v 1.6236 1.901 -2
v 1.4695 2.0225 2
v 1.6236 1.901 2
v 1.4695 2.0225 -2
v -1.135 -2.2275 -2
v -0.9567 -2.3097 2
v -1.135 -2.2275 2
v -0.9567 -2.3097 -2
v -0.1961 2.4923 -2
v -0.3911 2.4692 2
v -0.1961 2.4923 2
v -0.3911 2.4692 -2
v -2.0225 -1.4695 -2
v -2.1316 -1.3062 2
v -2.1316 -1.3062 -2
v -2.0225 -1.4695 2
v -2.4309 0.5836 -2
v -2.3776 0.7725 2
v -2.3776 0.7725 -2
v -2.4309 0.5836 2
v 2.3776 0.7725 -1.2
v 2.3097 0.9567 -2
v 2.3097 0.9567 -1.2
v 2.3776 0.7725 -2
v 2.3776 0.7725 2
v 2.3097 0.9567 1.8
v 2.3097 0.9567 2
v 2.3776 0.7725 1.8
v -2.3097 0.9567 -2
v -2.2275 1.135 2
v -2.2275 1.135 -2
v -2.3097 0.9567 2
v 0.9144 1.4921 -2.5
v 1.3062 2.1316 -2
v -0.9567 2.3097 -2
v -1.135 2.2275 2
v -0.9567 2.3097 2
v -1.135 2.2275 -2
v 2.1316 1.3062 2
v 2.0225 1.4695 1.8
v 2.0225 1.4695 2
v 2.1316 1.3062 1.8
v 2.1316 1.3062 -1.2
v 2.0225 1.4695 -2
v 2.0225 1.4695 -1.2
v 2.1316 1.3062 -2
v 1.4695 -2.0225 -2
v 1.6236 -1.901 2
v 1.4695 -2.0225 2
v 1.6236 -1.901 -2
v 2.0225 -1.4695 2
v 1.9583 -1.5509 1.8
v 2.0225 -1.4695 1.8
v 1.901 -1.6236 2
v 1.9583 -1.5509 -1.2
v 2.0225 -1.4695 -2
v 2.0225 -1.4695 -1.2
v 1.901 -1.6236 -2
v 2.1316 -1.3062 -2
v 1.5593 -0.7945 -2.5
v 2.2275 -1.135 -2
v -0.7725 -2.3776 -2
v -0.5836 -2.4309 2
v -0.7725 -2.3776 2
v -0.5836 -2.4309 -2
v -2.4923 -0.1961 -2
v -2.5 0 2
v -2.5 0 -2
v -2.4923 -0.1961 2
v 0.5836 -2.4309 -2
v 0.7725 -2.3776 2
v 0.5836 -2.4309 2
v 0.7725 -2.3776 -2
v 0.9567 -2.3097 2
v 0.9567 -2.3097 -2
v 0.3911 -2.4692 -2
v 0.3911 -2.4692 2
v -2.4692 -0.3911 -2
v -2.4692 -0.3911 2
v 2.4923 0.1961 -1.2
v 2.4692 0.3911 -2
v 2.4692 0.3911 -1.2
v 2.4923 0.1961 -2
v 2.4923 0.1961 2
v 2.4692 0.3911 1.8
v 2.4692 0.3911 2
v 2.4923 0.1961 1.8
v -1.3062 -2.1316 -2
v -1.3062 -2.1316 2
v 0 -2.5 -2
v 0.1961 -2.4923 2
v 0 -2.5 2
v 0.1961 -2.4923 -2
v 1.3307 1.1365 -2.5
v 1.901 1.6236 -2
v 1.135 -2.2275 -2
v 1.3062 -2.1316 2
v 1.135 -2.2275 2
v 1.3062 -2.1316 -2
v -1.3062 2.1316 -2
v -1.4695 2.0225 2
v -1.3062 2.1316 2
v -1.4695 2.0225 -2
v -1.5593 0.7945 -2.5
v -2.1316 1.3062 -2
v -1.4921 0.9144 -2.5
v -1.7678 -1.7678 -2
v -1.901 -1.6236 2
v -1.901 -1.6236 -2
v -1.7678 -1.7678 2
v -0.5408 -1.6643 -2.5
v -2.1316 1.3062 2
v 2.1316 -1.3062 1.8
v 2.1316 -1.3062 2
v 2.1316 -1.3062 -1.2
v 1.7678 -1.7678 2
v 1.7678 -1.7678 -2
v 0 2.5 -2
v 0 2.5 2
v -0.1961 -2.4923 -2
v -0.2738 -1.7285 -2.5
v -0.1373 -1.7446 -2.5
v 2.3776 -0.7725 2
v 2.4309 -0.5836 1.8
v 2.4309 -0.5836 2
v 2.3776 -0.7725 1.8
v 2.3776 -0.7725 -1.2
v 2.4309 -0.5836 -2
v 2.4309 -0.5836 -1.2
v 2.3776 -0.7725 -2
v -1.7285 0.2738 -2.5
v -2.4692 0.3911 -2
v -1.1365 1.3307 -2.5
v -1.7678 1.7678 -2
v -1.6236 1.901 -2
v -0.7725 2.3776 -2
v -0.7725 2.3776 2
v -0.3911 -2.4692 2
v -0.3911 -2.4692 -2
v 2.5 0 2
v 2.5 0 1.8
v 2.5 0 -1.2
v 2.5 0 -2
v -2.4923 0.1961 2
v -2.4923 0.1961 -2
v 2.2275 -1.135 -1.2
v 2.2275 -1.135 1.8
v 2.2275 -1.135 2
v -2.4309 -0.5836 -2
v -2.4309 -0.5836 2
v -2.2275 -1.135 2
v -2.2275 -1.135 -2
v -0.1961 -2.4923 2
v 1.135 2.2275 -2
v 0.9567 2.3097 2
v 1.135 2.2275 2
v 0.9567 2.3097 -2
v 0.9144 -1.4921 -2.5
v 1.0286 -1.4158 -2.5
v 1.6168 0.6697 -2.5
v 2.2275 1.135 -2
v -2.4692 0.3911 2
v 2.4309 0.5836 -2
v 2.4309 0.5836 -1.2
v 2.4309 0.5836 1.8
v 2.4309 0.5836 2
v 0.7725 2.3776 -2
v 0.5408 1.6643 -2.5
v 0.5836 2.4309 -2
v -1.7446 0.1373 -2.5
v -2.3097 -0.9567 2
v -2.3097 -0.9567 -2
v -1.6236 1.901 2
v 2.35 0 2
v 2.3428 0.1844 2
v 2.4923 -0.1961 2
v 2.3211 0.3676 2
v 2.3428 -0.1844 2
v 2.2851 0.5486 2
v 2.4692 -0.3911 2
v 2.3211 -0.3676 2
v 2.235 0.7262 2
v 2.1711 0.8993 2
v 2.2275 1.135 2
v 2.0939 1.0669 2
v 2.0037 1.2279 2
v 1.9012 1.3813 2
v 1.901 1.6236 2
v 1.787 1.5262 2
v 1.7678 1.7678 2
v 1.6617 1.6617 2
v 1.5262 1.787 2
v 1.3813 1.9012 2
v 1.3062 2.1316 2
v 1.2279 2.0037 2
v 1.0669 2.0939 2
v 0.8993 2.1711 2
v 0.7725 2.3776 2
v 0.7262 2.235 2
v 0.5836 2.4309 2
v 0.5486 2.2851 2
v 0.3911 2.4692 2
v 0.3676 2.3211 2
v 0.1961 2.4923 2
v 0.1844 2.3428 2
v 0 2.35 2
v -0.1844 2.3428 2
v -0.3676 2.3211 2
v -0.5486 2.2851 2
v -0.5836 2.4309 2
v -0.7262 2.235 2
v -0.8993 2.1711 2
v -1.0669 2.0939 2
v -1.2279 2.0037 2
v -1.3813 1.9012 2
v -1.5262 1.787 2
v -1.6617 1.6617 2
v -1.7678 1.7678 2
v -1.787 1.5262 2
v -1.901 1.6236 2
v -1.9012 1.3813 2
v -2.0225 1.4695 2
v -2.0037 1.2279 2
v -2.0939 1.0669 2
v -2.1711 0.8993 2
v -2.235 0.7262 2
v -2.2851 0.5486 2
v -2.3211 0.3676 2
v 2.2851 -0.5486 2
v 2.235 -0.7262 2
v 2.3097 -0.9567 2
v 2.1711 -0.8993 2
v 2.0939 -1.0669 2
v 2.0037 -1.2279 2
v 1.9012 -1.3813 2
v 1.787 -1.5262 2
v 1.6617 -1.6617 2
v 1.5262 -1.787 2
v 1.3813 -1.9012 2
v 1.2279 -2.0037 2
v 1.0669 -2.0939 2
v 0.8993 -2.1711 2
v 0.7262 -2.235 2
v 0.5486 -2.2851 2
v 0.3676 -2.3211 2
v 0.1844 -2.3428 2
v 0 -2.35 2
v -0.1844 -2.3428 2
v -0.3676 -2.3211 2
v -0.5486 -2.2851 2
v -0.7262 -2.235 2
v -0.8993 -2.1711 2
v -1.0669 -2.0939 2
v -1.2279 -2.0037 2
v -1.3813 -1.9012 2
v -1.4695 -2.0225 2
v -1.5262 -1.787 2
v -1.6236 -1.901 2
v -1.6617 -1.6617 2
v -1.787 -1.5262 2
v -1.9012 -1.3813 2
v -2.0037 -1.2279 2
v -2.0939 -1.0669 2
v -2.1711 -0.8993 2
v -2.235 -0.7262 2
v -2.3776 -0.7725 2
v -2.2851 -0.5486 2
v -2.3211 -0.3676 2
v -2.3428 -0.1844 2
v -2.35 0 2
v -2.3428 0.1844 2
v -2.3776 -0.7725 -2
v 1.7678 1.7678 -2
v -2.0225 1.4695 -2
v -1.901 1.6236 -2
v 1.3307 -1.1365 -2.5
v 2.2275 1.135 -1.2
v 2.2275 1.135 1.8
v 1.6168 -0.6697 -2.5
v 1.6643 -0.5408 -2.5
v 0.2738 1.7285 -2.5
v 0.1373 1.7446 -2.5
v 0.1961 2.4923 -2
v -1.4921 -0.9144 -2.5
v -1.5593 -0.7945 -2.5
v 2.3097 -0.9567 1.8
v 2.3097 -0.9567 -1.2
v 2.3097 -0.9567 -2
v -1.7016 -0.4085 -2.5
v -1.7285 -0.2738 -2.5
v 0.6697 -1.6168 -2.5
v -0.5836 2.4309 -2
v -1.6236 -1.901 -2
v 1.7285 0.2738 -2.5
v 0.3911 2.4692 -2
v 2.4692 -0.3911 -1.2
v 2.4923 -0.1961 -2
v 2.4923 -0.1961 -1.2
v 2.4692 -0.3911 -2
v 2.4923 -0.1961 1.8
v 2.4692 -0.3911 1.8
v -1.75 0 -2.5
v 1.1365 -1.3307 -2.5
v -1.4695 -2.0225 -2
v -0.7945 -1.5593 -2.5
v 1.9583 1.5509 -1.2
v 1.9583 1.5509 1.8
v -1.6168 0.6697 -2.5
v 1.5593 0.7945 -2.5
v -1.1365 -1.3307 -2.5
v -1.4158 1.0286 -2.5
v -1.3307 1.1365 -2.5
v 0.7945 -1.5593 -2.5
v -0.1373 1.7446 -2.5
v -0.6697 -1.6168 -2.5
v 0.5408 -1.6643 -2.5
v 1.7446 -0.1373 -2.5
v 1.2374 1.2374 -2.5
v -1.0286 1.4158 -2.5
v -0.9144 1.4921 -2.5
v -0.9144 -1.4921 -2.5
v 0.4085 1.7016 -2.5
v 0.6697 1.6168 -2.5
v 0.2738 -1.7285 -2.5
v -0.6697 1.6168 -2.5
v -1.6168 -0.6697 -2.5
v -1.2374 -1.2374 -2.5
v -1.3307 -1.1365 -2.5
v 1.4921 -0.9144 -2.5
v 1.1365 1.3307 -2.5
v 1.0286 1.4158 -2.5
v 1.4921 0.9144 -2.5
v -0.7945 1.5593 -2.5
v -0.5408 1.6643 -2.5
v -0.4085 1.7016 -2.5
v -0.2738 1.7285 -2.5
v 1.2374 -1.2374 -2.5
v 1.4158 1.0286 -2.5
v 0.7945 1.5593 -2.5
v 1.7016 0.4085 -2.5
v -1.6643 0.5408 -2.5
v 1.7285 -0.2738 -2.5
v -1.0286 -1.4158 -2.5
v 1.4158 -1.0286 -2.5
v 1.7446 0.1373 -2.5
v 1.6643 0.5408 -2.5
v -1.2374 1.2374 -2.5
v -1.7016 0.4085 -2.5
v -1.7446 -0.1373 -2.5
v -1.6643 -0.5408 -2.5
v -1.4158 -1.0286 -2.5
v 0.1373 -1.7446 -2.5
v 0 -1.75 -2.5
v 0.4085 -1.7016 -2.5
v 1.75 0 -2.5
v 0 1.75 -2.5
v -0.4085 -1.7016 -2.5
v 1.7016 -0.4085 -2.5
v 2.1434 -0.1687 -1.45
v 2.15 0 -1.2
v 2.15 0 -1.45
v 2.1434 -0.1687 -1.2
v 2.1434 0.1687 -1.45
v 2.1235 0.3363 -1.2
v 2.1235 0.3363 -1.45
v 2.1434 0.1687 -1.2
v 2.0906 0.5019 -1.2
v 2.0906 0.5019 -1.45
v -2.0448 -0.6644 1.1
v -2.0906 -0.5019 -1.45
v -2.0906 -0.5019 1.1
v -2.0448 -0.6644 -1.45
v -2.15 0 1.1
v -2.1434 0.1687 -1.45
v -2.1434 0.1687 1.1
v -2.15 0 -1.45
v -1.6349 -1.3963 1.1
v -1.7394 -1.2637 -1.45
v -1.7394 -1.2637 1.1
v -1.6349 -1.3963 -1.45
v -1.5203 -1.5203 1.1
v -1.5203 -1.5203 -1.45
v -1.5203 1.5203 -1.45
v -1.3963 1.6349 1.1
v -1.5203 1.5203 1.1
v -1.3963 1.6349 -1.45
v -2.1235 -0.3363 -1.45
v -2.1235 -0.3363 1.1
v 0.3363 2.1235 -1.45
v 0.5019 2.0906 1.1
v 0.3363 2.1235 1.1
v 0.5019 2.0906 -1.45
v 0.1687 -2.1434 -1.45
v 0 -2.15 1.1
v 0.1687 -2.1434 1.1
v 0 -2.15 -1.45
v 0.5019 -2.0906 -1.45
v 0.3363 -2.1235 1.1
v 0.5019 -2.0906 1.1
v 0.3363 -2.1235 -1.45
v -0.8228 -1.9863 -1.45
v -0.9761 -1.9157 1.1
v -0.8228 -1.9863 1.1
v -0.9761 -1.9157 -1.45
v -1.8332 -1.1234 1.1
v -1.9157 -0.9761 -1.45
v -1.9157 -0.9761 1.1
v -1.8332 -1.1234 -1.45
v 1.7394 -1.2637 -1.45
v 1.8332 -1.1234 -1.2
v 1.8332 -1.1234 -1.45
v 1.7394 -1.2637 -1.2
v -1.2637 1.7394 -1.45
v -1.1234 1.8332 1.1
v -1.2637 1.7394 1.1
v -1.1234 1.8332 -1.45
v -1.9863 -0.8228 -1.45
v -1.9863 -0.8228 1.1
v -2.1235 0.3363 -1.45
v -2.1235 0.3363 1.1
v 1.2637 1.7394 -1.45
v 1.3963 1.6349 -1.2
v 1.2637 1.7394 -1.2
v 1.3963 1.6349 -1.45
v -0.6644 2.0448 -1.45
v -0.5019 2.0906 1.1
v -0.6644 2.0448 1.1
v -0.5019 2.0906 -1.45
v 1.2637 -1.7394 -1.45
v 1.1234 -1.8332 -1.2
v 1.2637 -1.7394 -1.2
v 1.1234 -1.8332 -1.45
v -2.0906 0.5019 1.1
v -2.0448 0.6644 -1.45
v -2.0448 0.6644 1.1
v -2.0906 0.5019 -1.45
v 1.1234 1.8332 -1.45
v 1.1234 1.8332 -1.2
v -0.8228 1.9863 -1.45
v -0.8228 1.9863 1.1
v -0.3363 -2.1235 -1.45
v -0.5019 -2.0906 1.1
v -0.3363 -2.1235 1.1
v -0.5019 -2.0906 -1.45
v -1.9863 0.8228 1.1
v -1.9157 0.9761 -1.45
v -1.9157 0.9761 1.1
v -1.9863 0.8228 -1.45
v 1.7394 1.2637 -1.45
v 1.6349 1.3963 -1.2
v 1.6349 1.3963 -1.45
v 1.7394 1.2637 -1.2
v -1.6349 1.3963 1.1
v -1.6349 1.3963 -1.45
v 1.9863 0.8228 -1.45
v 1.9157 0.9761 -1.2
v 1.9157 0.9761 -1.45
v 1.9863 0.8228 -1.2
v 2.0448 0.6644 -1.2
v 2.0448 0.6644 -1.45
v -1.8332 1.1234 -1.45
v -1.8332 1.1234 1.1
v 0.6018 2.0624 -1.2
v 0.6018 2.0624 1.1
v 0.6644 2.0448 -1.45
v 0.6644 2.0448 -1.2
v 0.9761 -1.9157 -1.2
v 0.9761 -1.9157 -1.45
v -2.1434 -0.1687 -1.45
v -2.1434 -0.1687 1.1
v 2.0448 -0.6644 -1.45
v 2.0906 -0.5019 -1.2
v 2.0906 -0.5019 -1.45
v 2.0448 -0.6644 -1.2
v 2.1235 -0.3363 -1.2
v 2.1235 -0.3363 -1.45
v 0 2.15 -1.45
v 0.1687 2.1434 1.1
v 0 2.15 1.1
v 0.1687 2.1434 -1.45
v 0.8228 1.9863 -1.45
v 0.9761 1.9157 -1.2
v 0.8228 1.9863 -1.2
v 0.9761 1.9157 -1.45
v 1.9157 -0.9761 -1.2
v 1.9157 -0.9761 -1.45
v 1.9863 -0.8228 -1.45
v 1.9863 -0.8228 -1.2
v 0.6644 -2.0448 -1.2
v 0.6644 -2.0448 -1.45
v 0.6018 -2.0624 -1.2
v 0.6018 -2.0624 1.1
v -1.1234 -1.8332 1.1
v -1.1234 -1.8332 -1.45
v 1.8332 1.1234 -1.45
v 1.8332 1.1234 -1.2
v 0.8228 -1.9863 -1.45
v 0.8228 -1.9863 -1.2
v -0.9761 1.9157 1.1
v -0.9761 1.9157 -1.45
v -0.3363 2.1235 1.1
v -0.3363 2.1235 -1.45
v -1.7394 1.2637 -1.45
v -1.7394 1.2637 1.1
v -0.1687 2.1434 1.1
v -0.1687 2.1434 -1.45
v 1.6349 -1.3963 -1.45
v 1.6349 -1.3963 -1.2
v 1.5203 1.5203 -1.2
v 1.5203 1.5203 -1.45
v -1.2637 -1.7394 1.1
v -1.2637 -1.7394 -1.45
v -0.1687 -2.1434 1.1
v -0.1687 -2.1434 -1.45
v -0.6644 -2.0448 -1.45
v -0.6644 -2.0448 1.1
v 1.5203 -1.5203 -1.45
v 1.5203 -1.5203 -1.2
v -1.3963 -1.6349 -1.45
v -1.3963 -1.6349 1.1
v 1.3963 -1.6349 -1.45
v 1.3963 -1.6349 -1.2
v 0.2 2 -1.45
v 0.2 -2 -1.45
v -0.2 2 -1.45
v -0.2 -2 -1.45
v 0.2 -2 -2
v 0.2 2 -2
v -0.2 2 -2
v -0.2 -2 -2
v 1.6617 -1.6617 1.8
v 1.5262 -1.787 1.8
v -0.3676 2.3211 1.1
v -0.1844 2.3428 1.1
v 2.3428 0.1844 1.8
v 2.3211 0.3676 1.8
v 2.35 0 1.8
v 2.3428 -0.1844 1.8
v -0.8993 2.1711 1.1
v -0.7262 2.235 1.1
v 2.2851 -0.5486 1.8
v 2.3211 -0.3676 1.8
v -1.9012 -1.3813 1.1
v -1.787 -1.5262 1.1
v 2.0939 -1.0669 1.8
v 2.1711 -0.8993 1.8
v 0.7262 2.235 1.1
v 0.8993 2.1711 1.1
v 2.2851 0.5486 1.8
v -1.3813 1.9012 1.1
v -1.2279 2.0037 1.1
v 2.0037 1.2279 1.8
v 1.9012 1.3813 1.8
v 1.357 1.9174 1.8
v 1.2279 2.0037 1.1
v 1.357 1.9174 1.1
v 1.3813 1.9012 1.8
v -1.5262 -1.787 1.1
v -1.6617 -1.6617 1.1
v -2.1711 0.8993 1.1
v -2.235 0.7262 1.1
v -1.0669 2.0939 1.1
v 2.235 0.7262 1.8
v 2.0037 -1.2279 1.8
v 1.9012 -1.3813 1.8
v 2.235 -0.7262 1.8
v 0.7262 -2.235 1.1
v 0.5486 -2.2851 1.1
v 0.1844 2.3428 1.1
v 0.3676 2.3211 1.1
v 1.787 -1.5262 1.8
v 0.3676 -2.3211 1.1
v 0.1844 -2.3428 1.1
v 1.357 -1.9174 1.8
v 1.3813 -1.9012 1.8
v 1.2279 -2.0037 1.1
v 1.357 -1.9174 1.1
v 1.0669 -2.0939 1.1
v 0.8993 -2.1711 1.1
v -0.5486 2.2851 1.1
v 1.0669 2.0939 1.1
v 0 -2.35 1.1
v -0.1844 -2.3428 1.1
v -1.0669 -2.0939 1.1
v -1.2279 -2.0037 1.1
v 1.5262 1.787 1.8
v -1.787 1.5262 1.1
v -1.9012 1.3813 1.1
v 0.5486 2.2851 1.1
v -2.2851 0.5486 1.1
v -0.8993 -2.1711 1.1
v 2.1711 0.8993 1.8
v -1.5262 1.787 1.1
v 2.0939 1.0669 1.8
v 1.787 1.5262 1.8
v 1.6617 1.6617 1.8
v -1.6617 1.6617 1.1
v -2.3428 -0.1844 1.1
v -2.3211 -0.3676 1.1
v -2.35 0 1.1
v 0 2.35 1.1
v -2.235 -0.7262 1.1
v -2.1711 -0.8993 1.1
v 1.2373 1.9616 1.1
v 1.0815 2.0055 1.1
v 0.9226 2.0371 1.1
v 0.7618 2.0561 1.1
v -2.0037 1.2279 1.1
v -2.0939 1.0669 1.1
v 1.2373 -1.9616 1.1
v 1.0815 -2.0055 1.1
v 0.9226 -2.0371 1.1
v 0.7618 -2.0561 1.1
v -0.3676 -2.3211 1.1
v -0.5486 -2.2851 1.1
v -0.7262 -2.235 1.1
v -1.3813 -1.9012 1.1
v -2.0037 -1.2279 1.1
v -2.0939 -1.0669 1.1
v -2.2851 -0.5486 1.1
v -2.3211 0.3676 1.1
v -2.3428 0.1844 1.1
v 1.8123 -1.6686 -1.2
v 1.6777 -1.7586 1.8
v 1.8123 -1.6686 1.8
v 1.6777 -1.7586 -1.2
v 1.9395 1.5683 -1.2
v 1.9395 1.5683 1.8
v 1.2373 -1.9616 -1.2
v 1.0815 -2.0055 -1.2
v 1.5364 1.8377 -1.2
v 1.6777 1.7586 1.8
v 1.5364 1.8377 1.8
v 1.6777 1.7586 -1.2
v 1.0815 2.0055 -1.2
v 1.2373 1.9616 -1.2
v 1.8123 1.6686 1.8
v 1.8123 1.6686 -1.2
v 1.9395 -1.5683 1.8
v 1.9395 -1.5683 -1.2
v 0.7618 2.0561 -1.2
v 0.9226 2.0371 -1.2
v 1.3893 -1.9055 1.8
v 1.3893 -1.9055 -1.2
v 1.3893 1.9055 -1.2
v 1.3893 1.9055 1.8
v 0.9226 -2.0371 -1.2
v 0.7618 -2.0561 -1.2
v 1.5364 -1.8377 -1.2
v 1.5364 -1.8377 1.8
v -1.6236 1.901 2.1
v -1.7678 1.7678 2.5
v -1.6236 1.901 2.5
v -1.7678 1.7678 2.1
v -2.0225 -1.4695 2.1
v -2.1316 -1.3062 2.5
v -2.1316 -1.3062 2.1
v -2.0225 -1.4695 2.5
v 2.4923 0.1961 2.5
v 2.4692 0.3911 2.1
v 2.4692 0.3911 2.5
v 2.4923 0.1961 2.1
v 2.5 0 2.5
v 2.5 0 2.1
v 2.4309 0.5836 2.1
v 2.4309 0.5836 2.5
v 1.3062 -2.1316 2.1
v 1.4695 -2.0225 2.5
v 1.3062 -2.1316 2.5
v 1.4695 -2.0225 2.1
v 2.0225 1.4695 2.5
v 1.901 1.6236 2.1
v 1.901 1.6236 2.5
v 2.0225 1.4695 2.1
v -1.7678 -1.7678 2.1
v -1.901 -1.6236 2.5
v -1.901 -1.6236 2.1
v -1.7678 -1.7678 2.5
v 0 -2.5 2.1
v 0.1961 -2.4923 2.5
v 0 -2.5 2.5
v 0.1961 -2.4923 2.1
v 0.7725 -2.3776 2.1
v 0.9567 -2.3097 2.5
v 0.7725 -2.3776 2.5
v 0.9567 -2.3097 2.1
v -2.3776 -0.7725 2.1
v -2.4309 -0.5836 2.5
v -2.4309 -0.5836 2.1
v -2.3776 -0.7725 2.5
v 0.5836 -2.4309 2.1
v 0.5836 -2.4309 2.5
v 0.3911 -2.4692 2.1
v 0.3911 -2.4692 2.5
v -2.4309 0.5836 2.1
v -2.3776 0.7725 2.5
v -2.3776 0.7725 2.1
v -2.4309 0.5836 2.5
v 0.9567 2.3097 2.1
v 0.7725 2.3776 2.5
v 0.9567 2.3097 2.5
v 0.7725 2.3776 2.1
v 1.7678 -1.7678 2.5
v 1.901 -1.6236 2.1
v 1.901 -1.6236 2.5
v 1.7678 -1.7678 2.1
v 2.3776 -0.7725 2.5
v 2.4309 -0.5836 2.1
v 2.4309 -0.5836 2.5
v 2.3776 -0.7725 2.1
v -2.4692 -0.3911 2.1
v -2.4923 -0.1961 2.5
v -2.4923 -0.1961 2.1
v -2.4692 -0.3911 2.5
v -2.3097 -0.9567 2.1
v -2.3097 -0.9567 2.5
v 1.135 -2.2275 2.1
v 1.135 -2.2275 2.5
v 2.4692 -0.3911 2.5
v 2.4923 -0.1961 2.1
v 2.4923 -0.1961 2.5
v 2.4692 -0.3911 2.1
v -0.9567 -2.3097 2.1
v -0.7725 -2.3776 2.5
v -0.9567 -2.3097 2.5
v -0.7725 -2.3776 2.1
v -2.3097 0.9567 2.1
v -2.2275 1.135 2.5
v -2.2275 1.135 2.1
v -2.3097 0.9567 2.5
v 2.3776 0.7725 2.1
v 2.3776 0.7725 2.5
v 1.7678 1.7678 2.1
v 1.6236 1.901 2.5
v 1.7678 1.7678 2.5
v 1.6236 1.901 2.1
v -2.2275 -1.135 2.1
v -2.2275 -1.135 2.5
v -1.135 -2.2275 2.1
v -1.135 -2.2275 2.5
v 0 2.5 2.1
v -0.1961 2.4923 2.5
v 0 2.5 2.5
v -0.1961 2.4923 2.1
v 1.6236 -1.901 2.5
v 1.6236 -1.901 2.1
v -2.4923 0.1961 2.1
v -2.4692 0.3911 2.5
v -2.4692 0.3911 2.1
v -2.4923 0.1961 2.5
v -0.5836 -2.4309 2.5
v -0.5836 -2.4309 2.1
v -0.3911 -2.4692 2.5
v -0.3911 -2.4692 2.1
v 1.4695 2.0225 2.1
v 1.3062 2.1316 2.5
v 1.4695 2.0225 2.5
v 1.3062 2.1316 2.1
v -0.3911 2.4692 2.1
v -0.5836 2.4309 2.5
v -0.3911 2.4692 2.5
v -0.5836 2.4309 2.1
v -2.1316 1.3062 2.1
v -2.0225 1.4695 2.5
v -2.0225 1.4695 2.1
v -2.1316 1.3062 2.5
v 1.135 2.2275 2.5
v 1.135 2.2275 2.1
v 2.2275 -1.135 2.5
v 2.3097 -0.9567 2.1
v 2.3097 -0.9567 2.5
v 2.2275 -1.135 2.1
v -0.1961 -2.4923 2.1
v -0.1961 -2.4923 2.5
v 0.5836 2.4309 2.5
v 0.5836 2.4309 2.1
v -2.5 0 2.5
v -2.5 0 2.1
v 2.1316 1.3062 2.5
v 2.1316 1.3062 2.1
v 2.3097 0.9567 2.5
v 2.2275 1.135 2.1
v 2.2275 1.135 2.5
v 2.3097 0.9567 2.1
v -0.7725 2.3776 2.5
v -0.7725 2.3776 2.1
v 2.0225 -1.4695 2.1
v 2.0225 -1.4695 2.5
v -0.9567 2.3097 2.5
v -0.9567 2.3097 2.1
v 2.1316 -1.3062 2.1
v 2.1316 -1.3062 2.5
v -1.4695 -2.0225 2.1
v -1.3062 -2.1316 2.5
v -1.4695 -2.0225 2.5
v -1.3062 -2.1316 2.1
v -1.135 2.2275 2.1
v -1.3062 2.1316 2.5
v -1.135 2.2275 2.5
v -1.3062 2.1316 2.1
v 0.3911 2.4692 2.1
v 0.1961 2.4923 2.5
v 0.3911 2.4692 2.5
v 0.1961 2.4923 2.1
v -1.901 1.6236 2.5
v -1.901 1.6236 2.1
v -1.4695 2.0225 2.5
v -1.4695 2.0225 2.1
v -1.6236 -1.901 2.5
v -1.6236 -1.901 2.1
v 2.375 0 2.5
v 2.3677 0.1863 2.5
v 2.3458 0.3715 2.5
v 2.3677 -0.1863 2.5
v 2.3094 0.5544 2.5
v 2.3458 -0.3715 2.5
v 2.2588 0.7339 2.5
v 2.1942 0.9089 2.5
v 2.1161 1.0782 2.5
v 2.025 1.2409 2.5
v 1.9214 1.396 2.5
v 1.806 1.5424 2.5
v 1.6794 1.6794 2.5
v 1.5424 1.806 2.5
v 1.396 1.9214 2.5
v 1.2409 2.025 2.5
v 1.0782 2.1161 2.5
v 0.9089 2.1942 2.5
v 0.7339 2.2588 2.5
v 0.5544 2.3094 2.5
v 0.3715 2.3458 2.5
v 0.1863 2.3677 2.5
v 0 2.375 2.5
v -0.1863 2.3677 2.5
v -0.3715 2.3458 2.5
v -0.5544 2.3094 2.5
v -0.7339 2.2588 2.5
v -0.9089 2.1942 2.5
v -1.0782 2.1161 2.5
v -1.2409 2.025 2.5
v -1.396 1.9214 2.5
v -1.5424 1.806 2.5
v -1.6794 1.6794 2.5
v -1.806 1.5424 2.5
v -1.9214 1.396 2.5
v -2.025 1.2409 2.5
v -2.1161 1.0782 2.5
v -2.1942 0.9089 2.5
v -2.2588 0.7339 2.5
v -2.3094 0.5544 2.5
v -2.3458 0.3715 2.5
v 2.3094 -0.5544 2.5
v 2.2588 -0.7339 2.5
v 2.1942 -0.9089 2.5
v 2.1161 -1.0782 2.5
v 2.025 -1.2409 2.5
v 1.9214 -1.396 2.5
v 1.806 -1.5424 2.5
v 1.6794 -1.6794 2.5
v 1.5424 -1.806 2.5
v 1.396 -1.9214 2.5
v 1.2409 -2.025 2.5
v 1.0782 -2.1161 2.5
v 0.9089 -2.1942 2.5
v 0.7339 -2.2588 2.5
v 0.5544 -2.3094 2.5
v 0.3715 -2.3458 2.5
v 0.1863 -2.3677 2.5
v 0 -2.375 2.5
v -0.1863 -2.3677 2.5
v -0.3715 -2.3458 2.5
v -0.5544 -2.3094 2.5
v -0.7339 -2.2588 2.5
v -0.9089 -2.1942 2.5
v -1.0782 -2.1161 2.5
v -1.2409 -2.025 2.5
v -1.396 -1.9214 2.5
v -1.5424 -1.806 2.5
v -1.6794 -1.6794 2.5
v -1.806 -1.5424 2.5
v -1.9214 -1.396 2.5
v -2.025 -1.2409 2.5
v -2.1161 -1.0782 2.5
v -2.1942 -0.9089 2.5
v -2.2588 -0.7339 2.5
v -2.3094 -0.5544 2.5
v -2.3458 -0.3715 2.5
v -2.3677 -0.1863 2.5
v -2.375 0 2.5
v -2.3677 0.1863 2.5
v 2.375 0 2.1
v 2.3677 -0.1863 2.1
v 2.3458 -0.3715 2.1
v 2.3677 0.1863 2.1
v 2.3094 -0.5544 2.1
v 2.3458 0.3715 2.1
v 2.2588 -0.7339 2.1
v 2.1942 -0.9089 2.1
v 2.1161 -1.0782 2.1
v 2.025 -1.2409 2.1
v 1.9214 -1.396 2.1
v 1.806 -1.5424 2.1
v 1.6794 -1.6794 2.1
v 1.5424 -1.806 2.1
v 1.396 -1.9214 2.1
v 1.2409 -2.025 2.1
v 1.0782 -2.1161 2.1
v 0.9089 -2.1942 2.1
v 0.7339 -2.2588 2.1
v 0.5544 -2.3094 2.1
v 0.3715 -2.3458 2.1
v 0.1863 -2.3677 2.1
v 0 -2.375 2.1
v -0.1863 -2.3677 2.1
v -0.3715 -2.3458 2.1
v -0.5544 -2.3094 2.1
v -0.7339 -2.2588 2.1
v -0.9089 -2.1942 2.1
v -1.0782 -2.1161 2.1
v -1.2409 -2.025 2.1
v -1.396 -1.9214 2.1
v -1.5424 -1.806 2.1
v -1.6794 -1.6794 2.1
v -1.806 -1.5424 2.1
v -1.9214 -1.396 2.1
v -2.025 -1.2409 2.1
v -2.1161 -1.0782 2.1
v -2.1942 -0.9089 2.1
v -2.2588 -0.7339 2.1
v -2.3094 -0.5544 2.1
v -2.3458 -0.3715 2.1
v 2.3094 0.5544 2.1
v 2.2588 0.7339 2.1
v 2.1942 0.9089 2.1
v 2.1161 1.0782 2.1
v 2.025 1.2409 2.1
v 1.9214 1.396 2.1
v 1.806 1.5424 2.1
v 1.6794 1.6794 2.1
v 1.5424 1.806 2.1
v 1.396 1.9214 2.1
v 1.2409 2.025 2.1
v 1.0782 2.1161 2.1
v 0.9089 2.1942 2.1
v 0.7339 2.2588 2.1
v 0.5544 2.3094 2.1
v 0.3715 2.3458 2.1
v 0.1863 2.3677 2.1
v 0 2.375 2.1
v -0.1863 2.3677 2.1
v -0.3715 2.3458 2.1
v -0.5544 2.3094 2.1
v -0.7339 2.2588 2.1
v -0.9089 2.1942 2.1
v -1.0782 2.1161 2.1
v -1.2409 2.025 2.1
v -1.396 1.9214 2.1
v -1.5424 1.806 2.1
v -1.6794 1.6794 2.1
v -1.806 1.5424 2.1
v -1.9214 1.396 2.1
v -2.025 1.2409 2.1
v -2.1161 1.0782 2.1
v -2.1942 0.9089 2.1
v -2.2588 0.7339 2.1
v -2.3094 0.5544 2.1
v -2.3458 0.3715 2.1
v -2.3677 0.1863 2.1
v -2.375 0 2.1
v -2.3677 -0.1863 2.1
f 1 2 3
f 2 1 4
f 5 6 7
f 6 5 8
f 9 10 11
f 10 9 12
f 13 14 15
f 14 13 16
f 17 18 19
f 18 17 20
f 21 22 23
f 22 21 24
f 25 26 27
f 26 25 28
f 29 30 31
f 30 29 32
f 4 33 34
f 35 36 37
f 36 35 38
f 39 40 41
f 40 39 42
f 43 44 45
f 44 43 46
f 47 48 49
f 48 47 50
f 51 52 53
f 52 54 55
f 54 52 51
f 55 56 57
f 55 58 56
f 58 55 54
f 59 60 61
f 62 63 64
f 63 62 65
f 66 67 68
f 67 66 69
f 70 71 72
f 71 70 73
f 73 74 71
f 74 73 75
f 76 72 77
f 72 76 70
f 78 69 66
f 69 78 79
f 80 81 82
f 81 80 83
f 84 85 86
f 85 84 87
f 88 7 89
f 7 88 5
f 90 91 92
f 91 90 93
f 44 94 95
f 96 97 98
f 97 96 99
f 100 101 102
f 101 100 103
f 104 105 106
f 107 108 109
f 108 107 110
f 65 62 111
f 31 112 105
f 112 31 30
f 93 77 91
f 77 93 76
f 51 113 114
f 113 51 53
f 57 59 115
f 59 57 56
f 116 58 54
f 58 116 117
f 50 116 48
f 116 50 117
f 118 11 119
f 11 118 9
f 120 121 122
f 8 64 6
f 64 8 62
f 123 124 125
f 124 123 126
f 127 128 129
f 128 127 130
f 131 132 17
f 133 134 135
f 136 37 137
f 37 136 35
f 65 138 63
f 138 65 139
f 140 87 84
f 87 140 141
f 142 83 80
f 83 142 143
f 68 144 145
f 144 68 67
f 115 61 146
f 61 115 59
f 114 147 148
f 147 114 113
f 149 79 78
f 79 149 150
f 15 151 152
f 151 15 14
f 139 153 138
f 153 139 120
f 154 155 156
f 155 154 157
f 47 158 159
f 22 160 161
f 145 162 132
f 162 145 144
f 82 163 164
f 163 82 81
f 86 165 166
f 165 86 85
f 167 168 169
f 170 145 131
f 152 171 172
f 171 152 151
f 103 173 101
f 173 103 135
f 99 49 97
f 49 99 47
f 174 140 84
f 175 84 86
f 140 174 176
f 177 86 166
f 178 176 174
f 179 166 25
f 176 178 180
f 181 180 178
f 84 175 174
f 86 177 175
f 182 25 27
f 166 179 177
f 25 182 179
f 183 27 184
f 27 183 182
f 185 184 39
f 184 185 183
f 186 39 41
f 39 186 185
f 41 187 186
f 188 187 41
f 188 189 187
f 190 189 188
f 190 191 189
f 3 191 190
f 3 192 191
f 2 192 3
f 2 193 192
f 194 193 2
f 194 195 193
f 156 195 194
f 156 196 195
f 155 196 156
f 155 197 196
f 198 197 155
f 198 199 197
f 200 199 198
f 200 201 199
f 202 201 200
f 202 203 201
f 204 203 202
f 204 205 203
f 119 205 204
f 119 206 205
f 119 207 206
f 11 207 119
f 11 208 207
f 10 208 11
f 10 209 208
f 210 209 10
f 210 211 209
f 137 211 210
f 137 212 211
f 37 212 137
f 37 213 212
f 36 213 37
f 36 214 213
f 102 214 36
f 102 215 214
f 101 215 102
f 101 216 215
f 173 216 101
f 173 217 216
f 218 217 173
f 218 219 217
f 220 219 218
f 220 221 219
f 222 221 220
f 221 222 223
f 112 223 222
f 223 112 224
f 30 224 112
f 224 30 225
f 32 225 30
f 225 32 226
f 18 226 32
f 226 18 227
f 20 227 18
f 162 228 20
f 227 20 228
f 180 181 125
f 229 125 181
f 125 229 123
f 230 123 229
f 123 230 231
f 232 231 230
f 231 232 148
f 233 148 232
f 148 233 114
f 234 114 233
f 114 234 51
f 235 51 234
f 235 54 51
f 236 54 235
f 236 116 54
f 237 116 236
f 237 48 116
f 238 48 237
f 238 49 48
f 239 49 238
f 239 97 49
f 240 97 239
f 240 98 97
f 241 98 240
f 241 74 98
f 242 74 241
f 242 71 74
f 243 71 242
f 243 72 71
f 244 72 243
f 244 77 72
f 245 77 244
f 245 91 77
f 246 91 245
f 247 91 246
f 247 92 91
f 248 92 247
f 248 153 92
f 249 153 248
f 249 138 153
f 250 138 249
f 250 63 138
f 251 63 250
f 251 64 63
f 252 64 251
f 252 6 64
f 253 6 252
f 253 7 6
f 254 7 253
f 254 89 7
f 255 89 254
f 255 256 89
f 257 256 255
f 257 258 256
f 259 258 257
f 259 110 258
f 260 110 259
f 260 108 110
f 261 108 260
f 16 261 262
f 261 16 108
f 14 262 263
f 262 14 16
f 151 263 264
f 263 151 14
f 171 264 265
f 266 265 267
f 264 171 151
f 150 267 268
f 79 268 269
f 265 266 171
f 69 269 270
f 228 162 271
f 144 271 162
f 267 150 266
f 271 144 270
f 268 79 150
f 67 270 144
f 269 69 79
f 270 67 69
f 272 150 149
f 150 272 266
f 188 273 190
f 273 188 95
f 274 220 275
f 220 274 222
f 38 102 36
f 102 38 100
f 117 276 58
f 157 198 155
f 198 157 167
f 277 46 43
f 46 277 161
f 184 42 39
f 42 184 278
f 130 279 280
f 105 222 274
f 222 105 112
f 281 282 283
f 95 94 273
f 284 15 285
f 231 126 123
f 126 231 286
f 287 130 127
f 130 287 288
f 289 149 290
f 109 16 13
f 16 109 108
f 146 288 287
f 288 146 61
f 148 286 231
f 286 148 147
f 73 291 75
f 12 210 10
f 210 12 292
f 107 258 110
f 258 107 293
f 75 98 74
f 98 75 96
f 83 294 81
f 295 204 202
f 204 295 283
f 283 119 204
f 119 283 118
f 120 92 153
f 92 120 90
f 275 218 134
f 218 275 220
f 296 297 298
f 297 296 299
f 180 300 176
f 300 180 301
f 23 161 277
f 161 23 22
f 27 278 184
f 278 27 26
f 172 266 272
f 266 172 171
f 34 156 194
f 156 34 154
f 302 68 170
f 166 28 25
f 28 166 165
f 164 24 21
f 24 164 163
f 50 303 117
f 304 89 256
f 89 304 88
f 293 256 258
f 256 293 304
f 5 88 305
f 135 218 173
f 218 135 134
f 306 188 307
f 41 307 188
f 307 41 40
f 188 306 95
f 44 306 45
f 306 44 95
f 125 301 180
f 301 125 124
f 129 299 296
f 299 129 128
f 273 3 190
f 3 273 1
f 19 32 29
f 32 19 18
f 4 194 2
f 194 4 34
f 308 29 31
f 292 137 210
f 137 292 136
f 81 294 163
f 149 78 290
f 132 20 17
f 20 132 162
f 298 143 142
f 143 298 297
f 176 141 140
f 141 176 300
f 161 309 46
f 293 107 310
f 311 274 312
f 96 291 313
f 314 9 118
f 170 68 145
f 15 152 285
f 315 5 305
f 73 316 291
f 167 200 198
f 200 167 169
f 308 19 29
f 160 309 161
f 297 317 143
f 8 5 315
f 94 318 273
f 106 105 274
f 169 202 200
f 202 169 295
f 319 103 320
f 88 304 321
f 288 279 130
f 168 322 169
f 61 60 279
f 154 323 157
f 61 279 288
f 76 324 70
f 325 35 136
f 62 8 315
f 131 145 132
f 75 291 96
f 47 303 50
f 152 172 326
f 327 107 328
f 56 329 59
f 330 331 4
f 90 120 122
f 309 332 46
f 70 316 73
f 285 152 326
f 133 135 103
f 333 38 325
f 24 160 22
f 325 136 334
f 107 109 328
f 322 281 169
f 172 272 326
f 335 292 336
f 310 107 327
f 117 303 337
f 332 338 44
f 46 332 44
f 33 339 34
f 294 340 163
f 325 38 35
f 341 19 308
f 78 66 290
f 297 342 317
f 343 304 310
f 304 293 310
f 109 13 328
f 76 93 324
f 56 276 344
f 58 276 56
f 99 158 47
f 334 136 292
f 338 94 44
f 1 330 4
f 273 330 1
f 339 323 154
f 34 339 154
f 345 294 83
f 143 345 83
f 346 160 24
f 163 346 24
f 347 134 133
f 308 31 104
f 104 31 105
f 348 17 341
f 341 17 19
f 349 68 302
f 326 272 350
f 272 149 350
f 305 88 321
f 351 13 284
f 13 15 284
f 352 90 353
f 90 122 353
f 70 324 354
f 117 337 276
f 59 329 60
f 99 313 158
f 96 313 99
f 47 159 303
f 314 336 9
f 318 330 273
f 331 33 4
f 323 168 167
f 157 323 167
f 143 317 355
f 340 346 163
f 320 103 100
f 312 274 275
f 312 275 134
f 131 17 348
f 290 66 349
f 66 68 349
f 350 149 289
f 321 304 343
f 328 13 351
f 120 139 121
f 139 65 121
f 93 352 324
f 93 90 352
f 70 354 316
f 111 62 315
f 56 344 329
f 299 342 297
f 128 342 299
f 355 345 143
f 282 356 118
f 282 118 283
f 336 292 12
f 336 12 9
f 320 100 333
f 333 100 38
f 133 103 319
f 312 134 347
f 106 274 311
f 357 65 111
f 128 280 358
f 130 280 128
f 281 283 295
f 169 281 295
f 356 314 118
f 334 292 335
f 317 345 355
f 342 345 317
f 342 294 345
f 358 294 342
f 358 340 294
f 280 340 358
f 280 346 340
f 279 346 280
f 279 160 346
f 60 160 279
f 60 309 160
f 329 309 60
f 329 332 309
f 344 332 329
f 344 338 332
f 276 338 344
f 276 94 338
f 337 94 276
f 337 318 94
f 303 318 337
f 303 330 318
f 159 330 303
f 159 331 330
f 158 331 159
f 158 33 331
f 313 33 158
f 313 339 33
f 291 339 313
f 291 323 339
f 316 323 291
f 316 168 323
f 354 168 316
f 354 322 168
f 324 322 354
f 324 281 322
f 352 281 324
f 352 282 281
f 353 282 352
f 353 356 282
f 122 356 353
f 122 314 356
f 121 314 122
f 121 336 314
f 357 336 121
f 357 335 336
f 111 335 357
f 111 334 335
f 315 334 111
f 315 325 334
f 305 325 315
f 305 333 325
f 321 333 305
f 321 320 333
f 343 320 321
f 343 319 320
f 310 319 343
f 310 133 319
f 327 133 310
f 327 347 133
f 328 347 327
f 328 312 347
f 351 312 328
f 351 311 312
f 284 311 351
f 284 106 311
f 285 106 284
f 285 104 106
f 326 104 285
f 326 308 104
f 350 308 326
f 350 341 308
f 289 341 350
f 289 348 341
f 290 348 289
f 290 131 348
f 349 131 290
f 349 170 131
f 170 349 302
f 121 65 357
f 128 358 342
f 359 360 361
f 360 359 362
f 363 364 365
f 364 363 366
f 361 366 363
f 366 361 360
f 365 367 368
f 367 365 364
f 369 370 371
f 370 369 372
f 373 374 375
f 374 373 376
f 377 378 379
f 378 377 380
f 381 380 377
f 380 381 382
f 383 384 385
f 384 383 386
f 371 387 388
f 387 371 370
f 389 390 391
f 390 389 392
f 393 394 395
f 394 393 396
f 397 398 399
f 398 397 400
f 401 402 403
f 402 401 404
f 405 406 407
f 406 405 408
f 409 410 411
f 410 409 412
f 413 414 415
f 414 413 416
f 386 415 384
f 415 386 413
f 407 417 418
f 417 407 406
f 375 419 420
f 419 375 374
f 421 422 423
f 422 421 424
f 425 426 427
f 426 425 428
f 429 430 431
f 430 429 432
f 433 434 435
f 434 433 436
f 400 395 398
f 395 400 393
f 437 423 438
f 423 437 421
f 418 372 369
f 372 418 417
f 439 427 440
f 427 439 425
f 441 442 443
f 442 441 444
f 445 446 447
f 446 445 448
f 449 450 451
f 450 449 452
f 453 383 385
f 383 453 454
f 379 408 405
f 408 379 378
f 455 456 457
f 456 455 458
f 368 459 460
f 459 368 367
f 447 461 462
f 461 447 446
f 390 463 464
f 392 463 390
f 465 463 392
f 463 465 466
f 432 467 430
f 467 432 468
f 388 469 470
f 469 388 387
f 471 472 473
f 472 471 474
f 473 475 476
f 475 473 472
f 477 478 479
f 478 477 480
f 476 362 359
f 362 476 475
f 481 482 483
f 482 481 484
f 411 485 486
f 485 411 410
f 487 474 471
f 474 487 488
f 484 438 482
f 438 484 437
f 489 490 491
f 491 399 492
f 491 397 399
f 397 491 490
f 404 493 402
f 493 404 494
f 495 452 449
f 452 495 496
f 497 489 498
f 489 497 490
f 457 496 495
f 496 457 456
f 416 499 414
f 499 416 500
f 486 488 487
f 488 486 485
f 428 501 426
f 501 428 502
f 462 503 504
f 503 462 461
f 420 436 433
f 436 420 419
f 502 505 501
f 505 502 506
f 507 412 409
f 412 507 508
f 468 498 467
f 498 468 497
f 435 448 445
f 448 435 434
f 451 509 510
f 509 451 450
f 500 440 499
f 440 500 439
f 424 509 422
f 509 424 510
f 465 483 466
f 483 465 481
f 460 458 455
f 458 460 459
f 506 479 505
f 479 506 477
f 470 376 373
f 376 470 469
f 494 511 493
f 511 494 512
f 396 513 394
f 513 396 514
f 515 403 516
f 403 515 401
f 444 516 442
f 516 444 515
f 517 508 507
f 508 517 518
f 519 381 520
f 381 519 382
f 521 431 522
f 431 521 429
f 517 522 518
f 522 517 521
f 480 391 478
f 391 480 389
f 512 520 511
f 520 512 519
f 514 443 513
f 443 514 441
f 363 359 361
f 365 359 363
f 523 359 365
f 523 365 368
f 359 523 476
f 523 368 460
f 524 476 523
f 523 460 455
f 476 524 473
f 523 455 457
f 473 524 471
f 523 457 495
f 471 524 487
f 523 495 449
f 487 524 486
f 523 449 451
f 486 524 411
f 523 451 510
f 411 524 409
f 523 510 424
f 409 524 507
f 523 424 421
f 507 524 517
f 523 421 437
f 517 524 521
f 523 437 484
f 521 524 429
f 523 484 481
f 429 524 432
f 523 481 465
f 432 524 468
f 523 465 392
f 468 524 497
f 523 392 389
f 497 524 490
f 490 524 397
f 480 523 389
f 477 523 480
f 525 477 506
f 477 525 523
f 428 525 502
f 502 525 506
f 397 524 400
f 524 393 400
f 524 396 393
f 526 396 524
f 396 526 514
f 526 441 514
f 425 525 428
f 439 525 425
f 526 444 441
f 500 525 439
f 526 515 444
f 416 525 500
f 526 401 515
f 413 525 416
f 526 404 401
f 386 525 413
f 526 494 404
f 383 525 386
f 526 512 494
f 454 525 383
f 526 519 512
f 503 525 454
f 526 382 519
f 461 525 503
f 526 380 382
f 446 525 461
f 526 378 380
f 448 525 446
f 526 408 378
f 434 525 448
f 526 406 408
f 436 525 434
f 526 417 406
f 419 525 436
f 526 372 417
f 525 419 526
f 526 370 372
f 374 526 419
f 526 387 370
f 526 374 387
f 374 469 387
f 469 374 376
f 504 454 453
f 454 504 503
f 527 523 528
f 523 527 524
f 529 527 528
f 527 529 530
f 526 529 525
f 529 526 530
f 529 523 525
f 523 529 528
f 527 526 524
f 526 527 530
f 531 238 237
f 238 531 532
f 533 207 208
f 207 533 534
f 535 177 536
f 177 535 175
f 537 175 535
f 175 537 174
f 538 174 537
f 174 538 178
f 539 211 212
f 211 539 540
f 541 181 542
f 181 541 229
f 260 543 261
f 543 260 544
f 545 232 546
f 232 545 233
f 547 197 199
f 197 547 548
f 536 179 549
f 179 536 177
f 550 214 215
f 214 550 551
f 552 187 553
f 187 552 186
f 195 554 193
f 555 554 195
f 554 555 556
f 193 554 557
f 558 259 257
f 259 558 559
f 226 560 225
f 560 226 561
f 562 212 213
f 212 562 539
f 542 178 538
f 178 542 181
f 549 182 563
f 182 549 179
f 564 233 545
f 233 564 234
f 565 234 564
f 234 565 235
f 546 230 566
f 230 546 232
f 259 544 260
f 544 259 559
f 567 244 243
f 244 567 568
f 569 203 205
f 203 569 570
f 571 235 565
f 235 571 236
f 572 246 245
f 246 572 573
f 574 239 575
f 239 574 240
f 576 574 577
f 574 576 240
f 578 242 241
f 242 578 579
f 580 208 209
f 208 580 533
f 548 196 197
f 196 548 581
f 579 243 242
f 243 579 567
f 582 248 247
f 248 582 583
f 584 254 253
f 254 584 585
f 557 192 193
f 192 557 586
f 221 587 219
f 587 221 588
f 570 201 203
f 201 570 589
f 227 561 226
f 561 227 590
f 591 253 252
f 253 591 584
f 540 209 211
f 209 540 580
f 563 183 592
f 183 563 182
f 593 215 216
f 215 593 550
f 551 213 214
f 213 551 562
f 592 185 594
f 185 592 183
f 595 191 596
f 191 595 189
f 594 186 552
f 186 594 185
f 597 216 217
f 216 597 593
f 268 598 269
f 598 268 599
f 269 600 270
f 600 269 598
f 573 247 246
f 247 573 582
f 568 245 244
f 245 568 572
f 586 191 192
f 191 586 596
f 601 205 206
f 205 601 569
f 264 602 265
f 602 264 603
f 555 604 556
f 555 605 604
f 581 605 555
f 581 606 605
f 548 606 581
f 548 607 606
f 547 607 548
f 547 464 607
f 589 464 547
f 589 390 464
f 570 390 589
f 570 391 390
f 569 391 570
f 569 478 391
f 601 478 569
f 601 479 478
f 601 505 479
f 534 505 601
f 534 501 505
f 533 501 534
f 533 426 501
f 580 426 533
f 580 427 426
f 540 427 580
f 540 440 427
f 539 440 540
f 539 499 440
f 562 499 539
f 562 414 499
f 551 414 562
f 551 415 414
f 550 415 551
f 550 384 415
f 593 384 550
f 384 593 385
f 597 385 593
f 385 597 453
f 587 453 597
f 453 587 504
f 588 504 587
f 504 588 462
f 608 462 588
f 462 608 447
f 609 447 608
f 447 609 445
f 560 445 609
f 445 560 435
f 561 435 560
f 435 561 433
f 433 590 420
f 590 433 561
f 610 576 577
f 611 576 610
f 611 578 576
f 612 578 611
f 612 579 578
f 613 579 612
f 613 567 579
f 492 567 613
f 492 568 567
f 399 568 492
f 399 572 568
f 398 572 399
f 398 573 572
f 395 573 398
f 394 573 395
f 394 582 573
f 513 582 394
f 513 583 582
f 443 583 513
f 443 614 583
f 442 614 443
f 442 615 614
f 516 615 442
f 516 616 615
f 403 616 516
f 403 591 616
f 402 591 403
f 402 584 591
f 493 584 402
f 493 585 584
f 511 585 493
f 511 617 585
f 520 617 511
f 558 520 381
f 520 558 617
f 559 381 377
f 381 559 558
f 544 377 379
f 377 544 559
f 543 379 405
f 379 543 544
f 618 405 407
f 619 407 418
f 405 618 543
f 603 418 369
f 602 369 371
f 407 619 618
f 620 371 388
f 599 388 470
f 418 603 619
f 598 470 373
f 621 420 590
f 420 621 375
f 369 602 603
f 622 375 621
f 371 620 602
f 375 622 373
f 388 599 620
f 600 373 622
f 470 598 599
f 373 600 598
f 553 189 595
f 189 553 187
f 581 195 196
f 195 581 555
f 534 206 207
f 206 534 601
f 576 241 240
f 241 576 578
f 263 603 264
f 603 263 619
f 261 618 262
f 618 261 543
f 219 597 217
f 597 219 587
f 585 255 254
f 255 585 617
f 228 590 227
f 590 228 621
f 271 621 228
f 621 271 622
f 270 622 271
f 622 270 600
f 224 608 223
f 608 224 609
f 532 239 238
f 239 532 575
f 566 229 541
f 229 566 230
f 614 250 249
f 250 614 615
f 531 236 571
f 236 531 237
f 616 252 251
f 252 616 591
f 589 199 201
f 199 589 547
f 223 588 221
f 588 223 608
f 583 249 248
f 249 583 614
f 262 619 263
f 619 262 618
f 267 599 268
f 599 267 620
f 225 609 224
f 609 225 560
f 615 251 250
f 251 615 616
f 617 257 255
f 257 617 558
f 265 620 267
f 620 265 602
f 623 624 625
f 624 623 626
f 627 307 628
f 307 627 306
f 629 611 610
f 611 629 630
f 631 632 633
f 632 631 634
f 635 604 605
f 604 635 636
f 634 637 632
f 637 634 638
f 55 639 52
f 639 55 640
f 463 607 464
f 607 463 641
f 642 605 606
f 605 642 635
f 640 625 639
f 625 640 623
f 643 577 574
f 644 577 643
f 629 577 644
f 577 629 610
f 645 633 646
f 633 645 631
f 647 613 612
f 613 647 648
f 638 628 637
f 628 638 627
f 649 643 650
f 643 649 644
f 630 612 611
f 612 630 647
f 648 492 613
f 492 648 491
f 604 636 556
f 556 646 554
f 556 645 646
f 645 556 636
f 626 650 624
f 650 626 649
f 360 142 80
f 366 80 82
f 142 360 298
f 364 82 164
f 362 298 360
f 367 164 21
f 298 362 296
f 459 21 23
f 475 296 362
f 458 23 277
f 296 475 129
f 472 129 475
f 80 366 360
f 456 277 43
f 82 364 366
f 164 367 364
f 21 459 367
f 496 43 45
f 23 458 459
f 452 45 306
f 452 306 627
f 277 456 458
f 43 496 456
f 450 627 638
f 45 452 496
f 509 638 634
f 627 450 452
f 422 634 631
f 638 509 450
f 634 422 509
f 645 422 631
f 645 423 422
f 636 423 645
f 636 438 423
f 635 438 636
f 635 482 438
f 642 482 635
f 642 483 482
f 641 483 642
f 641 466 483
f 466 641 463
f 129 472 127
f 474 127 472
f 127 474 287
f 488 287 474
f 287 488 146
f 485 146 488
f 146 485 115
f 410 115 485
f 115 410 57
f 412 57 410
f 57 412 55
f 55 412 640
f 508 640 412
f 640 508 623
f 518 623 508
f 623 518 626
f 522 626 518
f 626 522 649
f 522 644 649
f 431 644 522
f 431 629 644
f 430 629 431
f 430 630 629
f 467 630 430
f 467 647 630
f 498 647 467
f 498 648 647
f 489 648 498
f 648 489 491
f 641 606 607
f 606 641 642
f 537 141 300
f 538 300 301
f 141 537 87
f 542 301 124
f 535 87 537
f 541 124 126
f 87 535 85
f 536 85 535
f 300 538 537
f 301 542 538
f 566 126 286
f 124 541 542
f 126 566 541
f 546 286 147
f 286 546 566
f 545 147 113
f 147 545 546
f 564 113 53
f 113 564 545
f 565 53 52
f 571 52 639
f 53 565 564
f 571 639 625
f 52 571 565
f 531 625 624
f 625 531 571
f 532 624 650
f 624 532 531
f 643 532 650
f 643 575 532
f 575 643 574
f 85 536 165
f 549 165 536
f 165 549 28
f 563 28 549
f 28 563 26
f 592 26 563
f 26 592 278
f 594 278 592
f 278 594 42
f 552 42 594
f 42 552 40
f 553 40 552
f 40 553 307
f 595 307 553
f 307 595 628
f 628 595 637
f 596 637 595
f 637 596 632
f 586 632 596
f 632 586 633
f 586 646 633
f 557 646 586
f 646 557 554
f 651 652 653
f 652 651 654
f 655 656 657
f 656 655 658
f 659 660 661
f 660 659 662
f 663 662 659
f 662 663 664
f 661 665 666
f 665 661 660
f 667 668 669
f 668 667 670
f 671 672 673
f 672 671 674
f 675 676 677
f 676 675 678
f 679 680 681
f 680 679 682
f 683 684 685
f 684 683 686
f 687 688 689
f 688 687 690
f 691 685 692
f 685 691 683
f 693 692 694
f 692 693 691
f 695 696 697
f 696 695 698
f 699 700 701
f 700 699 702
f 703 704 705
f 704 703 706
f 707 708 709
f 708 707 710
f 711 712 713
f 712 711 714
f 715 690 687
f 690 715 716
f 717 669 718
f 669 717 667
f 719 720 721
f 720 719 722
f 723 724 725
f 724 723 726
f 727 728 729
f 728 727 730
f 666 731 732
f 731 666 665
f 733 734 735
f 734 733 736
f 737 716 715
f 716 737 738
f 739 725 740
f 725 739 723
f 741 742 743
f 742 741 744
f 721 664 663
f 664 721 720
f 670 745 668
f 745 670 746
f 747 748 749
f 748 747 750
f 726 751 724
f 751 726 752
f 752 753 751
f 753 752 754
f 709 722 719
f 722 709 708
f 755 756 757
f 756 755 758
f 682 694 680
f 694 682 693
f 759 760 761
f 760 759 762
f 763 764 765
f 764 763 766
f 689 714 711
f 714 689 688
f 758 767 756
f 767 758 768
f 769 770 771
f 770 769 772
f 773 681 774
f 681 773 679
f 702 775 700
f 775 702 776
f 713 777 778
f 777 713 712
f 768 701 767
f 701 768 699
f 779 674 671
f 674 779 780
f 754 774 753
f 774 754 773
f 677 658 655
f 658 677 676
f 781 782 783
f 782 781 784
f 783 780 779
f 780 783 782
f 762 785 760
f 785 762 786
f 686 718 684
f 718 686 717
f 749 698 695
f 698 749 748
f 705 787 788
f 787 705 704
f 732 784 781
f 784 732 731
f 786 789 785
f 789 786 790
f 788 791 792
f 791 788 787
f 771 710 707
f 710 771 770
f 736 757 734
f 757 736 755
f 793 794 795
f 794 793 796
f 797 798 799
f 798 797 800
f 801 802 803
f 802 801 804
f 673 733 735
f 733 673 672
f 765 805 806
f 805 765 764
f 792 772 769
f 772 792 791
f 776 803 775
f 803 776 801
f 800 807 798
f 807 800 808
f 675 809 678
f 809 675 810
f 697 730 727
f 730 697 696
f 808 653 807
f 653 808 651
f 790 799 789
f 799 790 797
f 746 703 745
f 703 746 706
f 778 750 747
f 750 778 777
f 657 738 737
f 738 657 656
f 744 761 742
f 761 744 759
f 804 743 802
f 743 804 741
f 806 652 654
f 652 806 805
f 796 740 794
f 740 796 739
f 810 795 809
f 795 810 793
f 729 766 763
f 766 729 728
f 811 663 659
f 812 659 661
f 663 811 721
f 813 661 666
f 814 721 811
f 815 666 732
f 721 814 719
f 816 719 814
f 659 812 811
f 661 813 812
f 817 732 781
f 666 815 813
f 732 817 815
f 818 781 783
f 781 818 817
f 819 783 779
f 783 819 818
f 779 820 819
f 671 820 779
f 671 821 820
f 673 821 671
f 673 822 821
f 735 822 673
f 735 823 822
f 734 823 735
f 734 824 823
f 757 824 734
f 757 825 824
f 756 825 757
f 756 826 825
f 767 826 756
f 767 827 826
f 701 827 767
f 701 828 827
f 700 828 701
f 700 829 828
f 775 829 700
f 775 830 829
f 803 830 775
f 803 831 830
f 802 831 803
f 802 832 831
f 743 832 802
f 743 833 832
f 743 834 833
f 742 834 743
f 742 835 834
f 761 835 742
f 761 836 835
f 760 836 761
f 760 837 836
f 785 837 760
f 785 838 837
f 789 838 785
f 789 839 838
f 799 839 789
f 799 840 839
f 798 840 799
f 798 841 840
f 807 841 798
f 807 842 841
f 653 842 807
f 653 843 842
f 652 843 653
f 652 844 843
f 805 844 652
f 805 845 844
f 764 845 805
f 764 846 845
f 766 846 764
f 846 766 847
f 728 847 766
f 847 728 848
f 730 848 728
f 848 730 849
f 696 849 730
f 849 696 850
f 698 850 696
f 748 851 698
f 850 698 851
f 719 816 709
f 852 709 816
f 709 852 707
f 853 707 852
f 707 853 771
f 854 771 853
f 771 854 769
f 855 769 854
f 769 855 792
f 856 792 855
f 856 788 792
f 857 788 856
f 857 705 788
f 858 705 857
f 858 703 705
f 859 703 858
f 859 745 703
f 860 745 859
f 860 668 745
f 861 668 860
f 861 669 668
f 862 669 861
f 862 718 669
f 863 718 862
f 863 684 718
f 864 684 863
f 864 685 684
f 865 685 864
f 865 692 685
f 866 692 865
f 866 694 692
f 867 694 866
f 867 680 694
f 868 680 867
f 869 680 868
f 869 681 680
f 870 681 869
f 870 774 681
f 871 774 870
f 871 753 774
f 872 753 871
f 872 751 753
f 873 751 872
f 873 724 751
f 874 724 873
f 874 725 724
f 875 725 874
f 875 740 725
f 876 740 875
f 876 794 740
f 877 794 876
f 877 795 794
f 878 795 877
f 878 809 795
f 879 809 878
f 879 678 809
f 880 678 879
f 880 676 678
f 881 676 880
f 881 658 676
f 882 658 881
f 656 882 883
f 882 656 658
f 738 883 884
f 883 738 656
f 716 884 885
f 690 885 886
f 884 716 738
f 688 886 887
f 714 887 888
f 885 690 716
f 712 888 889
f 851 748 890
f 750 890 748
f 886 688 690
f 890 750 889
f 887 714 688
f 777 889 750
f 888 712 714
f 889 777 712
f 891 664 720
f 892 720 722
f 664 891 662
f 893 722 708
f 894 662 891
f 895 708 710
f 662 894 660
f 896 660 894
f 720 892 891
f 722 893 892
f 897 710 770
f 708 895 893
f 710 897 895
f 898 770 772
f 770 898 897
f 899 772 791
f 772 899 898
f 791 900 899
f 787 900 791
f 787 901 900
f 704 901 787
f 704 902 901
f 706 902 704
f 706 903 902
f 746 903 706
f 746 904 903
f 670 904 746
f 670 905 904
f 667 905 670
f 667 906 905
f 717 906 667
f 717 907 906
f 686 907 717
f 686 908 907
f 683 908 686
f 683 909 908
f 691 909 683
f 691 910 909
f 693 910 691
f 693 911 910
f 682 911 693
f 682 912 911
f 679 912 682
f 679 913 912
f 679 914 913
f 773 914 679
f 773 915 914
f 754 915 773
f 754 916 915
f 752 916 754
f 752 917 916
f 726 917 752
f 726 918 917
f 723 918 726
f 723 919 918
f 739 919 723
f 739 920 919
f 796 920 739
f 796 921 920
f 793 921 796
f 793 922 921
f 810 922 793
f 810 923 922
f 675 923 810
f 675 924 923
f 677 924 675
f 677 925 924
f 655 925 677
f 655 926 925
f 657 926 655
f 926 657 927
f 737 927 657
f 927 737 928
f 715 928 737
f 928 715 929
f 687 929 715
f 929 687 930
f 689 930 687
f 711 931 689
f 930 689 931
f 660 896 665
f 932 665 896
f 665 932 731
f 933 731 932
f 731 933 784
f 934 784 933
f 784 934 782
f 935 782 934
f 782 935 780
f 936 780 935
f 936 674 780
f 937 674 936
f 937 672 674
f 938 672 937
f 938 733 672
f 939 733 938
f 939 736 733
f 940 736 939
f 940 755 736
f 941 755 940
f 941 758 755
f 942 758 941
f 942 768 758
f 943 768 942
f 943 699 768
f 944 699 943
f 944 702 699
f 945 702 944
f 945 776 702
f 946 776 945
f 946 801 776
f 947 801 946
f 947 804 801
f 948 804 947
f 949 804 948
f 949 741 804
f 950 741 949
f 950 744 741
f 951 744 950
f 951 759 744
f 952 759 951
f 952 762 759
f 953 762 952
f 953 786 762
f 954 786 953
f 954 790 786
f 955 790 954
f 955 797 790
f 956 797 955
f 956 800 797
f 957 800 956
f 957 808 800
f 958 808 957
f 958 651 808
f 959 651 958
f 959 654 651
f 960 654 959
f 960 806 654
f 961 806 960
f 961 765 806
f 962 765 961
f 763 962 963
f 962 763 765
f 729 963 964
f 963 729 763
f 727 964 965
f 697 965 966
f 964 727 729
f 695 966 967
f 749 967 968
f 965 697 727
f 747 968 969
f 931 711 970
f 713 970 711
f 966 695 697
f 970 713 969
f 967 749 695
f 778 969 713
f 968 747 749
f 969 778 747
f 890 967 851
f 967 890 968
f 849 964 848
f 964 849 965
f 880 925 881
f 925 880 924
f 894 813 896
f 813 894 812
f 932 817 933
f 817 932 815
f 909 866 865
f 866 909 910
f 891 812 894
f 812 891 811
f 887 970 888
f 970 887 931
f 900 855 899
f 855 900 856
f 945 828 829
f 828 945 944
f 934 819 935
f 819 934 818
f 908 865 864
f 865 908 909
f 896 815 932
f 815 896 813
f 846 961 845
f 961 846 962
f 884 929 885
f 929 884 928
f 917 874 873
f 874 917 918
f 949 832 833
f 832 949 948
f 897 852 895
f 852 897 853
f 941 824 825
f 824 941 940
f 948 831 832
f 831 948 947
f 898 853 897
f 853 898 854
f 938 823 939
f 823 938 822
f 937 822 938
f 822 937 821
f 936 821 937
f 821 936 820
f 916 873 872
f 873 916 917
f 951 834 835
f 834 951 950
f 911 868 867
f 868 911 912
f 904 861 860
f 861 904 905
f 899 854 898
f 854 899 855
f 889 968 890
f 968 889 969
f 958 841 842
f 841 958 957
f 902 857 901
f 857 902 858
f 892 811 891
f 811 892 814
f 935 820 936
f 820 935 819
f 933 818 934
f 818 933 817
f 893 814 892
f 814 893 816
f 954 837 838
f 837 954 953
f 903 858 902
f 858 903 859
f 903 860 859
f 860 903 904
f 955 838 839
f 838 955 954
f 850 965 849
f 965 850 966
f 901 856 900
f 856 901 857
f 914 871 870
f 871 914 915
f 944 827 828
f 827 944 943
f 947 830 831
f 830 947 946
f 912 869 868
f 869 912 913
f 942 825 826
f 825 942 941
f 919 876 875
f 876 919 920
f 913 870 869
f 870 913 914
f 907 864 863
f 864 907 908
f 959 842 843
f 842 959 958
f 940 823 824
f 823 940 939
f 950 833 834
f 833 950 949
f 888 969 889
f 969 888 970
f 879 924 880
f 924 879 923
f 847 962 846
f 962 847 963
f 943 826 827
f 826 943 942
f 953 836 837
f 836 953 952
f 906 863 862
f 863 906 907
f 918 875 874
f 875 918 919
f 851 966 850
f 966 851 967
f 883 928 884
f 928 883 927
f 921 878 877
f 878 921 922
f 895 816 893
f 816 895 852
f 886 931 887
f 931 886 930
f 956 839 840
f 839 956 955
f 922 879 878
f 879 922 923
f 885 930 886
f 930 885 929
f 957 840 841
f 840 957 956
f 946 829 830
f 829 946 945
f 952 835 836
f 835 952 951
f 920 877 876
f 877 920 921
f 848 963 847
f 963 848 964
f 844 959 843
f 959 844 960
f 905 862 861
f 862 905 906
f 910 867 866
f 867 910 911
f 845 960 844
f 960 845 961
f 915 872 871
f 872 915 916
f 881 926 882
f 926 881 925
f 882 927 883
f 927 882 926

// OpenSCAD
// BIMS - Dual Component 5mm x 5mm Micro-System
// Variante A: Dual-Barrel for safe binary delivery (Seed Priming / Beneficial Microbes)
// Ethical, non-toxic, for regenerative agriculture

$fn = 80;

// Parameters
diameter = 5;
length = 5;
wall_thickness = 0.35;
payload_chamber_length = 3.5;

// Main body - Boat tail for stability
module main_body() {
    difference() {
        // Outer shell with boat tail
        hull() {
            cylinder(d=diameter, h=length-1, center=true);
            translate([0,0,-length/2 + 0.5]) cylinder(d=diameter*0.7, h=1, center=true);
        }
        
        // Internal dual chambers
        translate([0,0,0.3]) cylinder(d=diameter - 2*wall_thickness, h=payload_chamber_length, center=true);
        
        // Separation wall for two components
        cube([0.4, diameter-1, payload_chamber_length+0.5], center=true);
        
        // Front frangible zone (impact only release)
        translate([0,0, length/2 - 0.8]) cylinder(d=diameter - 0.3, h=1.2, center=true);
    }
}

// Component 1 chamber (e.g. seeds/microbes)
module component1() {
    translate([0,0,0.3]) 
    cylinder(d=diameter - 2.5*wall_thickness, h=payload_chamber_length-0.5, center=true);
}

// Component 2 chamber (e.g. activator / bio-glue)
module component2() {
    translate([0.6,0,0.3]) 
    cylinder(d=diameter - 2.5*wall_thickness, h=payload_chamber_length-0.5, center=true);
}

// Assembly
difference() {
    main_body();
    component1();
    component2();
}

// Impact trigger features (thin crush zones)
translate([0,0, length/2 - 0.4]) 
difference() {
    cylinder(d=diameter, h=0.4);
    cylinder(d=diameter - 0.25, h=0.4);
}

echo("BIMS Dual Component Design - Ethical Precision Delivery");
echo("Target dispersion <5cm when used in dual barrel setup");
